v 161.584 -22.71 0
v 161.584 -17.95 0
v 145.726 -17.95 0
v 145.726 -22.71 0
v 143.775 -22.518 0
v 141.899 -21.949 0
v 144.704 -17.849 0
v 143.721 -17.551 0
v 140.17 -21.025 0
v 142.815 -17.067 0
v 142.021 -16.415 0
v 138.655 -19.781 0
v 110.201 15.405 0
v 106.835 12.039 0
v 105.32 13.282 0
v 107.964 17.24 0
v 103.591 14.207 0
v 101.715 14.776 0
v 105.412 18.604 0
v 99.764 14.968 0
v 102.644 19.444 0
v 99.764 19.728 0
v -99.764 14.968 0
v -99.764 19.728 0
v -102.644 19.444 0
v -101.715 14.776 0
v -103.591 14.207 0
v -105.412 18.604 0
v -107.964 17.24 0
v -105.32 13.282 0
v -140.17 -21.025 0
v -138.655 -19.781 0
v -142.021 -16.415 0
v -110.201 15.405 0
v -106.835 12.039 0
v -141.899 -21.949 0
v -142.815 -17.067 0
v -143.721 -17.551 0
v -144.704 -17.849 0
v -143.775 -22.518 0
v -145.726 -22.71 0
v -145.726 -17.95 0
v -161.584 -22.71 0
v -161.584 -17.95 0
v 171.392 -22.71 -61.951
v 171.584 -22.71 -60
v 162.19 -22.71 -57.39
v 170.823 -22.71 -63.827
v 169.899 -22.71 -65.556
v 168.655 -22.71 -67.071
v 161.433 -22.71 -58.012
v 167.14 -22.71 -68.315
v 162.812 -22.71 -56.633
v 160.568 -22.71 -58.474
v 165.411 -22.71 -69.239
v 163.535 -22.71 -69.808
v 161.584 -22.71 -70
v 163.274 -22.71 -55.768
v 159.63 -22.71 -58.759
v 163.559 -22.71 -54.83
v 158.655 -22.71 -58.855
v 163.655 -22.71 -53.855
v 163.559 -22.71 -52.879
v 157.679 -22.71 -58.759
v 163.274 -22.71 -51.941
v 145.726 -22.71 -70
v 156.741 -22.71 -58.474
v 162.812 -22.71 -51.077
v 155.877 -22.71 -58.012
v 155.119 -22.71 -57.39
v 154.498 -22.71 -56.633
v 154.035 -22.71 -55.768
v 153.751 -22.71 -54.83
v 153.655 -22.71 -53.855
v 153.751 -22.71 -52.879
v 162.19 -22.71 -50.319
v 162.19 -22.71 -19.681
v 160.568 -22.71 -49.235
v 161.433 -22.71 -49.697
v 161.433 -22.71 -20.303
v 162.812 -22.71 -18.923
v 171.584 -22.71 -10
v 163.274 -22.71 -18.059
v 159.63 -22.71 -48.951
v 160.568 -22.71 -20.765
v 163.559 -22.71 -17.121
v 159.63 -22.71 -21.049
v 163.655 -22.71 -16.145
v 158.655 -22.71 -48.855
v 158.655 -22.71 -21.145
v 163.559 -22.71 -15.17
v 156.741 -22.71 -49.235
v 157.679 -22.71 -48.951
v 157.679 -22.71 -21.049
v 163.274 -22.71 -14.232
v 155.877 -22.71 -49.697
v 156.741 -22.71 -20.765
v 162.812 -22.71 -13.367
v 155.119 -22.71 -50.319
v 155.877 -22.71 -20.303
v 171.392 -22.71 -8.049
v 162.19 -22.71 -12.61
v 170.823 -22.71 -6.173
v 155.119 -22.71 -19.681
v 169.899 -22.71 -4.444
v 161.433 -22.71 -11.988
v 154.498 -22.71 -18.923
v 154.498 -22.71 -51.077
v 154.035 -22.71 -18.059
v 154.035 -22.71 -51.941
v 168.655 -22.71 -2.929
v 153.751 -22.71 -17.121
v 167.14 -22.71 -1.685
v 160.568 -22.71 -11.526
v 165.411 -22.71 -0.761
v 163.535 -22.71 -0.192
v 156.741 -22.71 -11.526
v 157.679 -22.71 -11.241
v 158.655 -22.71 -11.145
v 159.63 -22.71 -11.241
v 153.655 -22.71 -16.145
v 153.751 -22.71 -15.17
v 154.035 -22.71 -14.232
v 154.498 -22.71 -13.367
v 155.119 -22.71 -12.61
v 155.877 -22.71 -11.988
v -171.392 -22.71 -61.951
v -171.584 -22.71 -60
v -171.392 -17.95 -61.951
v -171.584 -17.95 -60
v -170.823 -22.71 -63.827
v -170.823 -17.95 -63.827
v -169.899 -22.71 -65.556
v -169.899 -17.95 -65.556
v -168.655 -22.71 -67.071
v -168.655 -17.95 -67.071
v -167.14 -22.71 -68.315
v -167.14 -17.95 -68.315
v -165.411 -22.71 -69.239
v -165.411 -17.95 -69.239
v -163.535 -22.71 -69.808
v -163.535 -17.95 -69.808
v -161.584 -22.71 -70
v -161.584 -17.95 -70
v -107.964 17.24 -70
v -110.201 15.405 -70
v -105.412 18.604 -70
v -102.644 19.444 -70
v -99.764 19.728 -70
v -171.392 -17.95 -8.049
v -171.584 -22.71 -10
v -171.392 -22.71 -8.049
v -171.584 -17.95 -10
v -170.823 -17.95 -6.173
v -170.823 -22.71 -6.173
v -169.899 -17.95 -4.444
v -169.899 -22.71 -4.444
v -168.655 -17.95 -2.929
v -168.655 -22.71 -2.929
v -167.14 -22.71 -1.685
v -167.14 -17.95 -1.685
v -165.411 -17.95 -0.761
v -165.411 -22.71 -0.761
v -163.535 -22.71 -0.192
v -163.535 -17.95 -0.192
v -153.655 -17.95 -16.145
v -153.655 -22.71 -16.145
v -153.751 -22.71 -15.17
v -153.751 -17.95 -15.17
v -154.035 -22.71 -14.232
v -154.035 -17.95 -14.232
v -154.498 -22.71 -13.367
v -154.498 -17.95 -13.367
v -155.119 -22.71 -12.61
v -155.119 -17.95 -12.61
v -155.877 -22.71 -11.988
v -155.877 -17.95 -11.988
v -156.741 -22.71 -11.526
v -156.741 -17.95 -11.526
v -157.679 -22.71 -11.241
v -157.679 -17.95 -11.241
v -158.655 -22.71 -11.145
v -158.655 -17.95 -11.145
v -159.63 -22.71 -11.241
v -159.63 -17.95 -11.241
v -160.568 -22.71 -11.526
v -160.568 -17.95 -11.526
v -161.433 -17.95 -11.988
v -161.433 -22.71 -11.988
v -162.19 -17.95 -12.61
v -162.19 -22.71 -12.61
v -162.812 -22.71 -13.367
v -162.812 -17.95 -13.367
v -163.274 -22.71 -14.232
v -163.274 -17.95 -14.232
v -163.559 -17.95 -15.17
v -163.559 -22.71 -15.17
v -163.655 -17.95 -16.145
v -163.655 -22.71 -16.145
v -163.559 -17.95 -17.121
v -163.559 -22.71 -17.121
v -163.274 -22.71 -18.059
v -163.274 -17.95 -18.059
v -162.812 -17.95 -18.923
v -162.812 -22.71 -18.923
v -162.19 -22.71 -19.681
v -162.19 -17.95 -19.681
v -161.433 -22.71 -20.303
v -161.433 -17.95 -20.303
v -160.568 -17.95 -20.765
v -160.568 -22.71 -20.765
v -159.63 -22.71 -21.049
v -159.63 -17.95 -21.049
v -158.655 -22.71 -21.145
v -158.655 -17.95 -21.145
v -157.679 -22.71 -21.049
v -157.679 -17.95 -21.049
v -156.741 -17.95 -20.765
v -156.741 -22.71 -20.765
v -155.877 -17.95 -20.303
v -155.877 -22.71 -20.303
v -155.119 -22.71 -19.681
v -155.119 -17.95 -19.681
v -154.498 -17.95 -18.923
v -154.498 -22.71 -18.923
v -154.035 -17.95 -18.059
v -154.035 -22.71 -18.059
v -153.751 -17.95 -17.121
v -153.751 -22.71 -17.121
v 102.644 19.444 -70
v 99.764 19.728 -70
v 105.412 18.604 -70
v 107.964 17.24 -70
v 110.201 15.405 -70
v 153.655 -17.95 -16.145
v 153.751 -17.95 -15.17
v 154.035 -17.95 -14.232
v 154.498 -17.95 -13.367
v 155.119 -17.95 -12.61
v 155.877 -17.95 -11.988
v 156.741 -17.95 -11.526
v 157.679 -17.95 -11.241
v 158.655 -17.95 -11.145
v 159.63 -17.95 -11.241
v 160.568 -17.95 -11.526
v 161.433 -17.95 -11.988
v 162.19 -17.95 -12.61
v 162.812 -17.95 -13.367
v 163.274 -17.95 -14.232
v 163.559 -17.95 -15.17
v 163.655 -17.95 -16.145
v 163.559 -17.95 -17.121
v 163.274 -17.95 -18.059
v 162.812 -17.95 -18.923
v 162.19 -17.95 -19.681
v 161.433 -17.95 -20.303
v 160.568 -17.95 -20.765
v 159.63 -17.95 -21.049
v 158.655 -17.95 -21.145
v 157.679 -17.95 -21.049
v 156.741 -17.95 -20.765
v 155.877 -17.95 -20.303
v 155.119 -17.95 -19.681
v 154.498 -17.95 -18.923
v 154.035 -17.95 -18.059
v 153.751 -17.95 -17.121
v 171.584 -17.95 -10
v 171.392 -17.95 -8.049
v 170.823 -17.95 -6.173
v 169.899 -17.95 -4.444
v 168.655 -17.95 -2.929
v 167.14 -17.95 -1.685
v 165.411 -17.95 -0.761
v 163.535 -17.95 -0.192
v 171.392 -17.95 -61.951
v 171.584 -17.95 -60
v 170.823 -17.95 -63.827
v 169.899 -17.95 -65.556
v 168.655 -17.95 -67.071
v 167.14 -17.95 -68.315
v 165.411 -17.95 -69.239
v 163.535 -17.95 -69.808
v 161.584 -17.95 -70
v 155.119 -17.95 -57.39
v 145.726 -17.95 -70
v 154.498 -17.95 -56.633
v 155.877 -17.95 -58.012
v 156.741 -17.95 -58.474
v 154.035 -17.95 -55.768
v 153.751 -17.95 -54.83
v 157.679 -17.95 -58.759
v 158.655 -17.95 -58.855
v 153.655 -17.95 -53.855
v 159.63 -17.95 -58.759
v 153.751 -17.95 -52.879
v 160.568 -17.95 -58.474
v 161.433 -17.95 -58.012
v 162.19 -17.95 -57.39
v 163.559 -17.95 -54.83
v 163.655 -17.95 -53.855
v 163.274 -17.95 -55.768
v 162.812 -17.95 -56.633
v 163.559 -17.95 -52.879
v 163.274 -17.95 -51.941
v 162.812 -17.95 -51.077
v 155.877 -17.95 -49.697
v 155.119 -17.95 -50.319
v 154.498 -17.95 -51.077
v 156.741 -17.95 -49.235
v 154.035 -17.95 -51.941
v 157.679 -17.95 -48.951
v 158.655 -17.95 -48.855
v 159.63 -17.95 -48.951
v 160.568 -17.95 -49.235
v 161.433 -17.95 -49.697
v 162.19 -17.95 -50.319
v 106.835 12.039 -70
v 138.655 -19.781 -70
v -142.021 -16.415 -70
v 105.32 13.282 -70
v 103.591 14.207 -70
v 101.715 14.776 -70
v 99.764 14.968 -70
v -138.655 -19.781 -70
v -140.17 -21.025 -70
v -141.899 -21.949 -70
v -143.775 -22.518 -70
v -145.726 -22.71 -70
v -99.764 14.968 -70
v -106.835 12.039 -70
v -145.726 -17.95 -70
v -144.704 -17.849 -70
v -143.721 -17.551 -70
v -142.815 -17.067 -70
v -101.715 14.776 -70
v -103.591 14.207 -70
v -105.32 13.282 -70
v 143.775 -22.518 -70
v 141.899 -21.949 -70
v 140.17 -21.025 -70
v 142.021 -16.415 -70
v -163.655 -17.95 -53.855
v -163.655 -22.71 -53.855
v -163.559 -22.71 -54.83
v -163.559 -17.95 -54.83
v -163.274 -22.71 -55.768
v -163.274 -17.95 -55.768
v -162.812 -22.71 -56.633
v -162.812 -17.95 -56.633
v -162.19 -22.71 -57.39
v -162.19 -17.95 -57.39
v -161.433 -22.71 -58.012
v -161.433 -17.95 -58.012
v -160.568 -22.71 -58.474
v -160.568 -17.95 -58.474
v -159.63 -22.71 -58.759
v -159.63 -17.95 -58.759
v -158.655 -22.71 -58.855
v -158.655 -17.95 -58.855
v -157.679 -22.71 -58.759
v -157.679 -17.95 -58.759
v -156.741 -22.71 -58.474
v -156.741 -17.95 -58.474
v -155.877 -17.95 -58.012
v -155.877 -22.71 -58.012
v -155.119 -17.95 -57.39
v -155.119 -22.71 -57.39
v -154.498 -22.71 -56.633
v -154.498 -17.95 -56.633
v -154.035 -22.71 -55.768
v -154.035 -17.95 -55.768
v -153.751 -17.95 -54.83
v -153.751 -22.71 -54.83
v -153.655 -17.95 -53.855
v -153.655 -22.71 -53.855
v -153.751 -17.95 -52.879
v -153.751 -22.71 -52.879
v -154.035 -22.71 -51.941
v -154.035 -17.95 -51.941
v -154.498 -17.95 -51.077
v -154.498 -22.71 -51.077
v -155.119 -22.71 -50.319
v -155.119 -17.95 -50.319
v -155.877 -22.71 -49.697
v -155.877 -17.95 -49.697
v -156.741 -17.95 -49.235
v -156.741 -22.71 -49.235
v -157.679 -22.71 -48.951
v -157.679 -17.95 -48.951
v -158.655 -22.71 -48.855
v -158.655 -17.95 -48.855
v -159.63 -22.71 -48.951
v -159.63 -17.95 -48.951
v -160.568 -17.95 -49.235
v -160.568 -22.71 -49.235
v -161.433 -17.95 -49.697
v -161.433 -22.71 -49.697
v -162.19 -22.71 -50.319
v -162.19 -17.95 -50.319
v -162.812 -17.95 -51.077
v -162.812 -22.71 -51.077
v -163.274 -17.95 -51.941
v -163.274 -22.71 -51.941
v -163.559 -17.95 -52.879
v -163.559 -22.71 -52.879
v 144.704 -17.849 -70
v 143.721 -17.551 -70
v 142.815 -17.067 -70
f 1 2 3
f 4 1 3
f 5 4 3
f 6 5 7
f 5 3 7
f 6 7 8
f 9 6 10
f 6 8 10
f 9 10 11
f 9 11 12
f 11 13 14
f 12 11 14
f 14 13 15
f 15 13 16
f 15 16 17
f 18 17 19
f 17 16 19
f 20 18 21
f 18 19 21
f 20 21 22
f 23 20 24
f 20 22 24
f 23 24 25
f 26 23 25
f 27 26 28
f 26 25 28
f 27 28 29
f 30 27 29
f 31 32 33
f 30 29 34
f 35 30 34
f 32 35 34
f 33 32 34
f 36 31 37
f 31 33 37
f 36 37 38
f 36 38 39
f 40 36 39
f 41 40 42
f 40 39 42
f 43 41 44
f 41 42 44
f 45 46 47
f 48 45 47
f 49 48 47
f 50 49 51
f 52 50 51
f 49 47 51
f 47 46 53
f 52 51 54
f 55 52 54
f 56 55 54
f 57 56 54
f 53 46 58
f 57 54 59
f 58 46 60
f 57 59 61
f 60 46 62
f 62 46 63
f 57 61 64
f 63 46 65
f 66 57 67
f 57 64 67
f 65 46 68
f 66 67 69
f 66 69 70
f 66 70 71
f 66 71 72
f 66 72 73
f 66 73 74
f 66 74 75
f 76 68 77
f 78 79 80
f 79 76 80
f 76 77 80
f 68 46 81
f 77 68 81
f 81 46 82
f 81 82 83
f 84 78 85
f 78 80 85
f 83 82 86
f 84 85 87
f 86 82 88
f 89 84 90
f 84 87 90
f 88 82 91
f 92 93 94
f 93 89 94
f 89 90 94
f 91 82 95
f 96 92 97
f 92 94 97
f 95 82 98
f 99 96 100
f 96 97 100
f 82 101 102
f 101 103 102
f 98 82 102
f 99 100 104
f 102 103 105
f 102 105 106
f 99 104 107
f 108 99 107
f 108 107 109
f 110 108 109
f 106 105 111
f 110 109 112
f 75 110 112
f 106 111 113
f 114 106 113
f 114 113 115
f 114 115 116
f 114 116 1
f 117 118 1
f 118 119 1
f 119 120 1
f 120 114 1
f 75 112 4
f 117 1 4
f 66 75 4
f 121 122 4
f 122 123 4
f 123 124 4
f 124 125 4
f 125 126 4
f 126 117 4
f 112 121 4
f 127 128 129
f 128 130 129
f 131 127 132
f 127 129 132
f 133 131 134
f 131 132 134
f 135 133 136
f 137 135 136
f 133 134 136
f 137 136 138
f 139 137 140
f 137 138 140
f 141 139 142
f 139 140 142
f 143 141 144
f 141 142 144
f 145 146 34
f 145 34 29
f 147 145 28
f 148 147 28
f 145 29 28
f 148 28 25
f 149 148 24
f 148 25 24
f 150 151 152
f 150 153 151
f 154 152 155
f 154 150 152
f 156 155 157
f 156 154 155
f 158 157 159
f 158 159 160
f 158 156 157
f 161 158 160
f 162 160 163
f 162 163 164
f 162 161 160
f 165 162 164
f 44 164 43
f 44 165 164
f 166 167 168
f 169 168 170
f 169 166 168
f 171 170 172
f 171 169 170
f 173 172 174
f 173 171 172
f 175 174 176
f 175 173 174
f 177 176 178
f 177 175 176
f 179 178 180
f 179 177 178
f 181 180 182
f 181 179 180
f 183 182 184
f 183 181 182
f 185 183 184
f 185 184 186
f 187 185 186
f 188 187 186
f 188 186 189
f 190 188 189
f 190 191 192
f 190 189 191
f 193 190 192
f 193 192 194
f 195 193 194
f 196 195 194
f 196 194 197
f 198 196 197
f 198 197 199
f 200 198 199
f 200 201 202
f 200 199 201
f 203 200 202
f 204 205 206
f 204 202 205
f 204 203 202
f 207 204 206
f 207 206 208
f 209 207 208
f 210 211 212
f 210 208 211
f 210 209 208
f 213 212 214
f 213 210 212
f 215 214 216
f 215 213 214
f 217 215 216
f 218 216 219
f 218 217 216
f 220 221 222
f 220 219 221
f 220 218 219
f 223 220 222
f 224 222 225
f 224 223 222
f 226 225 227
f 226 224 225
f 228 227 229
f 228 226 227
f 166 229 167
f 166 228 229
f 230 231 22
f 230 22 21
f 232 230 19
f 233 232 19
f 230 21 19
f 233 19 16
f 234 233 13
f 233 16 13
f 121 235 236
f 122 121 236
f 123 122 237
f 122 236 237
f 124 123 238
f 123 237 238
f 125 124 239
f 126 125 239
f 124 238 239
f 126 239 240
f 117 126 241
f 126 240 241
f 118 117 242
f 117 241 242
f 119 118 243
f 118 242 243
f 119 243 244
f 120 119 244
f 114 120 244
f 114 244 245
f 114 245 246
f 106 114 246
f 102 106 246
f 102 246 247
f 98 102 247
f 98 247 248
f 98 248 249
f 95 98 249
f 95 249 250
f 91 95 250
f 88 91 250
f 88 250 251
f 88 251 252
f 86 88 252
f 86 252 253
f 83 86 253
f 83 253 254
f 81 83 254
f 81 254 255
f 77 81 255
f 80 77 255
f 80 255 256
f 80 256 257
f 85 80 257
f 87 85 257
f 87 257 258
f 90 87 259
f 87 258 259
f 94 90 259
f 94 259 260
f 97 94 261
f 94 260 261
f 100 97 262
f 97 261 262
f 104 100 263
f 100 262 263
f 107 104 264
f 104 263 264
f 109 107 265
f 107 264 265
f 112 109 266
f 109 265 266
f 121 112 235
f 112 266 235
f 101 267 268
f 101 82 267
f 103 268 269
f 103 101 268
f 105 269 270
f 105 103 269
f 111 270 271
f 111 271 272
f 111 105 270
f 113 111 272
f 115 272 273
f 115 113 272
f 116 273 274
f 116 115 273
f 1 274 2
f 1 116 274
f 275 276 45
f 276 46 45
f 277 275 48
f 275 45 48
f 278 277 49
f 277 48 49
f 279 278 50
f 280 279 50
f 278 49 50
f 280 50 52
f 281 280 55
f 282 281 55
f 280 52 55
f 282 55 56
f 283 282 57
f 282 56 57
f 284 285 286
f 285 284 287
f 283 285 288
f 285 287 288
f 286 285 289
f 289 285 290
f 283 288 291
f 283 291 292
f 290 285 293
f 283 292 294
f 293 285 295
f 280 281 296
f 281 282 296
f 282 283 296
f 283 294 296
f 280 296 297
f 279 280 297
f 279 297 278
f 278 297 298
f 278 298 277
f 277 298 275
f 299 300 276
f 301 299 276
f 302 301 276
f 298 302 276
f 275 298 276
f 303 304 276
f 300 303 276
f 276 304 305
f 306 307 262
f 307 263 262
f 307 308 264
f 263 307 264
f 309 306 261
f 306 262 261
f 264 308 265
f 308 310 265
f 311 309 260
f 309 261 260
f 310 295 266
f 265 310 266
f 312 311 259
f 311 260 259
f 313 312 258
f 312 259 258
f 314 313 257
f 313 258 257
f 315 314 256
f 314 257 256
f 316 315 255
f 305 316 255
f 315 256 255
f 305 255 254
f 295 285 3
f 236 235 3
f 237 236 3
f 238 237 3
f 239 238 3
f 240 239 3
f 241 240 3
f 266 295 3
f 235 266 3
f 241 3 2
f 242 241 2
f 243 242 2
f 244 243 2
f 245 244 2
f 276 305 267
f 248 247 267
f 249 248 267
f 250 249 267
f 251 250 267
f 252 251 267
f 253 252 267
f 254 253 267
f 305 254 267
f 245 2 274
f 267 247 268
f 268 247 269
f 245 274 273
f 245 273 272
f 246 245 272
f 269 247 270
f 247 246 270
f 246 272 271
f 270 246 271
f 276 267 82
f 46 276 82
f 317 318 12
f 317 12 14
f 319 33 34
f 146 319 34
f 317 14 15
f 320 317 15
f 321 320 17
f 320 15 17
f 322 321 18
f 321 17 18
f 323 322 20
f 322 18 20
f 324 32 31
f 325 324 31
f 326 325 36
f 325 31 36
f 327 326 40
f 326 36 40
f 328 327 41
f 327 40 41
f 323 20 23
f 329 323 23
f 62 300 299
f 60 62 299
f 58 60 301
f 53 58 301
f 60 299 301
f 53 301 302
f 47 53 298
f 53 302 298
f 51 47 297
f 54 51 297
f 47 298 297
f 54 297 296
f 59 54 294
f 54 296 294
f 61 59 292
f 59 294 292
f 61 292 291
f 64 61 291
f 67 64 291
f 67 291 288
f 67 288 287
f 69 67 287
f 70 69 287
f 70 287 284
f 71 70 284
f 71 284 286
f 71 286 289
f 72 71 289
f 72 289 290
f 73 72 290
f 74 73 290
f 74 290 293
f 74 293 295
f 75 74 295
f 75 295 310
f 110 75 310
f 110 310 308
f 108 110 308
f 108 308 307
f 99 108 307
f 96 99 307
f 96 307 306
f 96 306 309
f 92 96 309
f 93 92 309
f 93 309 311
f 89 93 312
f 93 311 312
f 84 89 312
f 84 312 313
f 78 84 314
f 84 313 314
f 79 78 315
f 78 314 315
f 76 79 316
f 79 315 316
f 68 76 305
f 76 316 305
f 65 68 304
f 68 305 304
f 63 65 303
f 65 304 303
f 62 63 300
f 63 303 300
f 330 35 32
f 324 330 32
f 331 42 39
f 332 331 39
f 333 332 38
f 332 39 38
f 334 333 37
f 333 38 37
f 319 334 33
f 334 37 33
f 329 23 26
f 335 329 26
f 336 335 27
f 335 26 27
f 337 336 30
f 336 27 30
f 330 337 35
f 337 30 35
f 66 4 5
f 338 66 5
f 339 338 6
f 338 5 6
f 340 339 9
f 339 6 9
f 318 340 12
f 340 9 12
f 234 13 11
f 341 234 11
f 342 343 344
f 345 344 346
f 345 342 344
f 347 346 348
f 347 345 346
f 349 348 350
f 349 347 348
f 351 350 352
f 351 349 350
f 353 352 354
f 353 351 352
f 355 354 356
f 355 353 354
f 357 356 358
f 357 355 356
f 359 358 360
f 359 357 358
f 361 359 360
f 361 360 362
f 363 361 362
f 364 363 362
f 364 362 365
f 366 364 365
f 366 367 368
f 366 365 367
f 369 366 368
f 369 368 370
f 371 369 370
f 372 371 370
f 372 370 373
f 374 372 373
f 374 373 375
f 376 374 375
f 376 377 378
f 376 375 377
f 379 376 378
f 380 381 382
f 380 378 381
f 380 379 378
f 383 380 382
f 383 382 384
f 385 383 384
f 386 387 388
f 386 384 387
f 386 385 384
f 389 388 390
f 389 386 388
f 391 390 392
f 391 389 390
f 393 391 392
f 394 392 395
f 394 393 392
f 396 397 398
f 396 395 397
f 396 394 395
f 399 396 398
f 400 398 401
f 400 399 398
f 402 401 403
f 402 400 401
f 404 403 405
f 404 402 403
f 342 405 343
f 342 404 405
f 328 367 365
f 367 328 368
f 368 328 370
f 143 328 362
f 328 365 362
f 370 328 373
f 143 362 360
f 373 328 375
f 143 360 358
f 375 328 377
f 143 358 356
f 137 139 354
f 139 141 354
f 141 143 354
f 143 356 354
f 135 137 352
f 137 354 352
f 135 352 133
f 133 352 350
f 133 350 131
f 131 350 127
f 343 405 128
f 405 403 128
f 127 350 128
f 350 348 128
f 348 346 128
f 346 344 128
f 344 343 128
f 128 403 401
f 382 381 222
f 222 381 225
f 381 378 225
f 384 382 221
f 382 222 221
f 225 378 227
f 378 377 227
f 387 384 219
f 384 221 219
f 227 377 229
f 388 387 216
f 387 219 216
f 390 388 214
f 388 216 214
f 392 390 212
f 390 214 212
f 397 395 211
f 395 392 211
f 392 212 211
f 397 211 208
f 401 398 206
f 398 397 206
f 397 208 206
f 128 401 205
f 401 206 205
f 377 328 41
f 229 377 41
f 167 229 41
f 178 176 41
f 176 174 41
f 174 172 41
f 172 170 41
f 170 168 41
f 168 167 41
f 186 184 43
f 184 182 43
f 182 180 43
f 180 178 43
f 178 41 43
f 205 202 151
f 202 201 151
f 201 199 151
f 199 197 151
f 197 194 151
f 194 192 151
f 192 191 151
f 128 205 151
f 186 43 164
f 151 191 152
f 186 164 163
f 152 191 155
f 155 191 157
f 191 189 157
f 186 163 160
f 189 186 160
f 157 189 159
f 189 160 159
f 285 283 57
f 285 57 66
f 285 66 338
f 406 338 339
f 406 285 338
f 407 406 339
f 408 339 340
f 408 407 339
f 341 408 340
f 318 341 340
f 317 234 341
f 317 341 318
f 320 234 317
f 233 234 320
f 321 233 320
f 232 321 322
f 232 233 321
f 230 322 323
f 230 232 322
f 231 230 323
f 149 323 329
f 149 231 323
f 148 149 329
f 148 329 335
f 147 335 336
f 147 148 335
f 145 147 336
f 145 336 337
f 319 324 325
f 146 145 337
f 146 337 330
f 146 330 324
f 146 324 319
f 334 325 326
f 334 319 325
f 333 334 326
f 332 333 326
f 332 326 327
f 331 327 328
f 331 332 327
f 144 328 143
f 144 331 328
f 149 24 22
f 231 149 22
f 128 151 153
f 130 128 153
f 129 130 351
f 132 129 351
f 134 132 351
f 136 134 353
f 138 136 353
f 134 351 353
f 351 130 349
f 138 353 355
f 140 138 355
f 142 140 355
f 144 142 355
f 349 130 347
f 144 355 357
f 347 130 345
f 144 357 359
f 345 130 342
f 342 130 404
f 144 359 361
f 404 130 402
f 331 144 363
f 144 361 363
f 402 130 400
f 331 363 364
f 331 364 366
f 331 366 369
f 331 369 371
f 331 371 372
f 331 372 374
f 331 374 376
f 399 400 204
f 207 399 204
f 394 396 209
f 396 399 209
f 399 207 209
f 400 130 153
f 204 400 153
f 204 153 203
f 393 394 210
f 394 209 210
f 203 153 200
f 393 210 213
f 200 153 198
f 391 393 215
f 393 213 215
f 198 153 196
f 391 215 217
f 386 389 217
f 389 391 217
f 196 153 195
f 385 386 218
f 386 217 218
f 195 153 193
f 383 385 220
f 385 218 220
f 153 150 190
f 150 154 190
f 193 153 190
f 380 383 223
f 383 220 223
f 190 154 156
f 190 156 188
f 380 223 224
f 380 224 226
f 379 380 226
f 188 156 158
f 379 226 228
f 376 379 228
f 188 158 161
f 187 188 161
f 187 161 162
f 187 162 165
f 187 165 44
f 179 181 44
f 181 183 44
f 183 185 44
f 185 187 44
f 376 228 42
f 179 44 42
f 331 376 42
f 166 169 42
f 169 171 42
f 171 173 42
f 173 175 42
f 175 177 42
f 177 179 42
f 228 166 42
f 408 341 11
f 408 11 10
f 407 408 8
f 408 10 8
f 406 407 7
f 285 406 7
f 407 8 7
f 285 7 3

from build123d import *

# Parameters (mm, degrees)
BOSS_EXTRUDE1_DEPTH = 70
FILLET1_R           = 10
SKETCH2_R           = 5
CUT_EXTRUDE1_DEPTH  = 10


with BuildPart() as part:
    # Sketch1 → Boss-Extrude1 (new body)
    with BuildSketch(Plane.XY):
        with BuildLine():
            Line((110.200913438, 15.404640081), (142.020718591, -16.415165072))
            ThreePointArc((142.020718591, -16.415165072), (143.720696939, -17.551054289), (145.725958124, -17.949925539))
            Line((145.725958124, -17.949925539), (171.583822501, -17.949925539))
            Line((171.583822501, -17.949925539), (171.583822501, -22.709925539))
            Line((171.583822501, -22.709925539), (145.725958124, -22.709925539))
            ThreePointArc((145.725958124, -22.709925539), (141.899123801, -21.948720864), (138.654890312, -19.780993351))
            Line((138.654890312, -19.780993351), (106.835085159, 12.038811802))
            ThreePointArc((106.835085159, 12.038811802), (103.590851671, 14.206539316), (99.764017347, 14.967743991))
            Line((99.764017347, 14.967743991), (12.581613091, 14.967743991))
            Line((12.581613091, 14.967743991), (-99.764017347, 14.967743991))
            ThreePointArc((-99.764017347, 14.967743991), (-103.590851671, 14.206539316), (-106.835085159, 12.038811802))
            Line((-106.835085159, 12.038811802), (-138.654890312, -19.780993351))
            ThreePointArc((-138.654890312, -19.780993351), (-141.899123801, -21.948720864), (-145.725958124, -22.709925539))
            Line((-145.725958124, -22.709925539), (-171.583822501, -22.709925539))
            Line((-171.583822501, -22.709925539), (-171.583822501, -17.949925539))
            Line((-171.583822501, -17.949925539), (-145.725958124, -17.949925539))
            ThreePointArc((-145.725958124, -17.949925539), (-143.720696939, -17.551054289), (-142.020718591, -16.415165072))
            Line((-142.020718591, -16.415165072), (-110.200913438, 15.404640081))
            ThreePointArc((-110.200913438, 15.404640081), (-105.412424809, 18.60420589), (-99.764017347, 19.727743991))
            Line((-99.764017347, 19.727743991), (12.581613091, 19.727743991))
            Line((12.581613091, 19.727743991), (99.764017347, 19.727743991))
            ThreePointArc((99.764017347, 19.727743991), (105.412424809, 18.60420589), (110.200913438, 15.404640081))
        make_face()
    extrude(amount=-BOSS_EXTRUDE1_DEPTH)

    # Fillet1
    fillet1_edges = [part.edges().sort_by_distance(p)[0] for p in [
        (171.583822501, -20.329925539, 0),
        (-171.583822501, -20.329925539, 0),
        (-171.583822501, -20.329925539, -70),
        (171.583822501, -20.329925539, -70),
    ]]
    fillet(fillet1_edges, radius=FILLET1_R)

    # Sketch2 → Cut-Extrude1 (cut)
    with BuildSketch(Plane(origin=(0, -17.949925539, 0), x_dir=(1, 0, 0), z_dir=(0, 1, 0))):
        with BuildLine():
            ThreePointArc((153.654890312, 53.854773815), (158.654890312, 48.854773815), (163.654890312, 53.854773815))
            Line((163.654890312, 53.854773815), (153.654890312, 53.854773815))
        make_face()
        with BuildLine():
            Line((153.654890312, 53.854773815), (163.654890312, 53.854773815))
            ThreePointArc((163.654890312, 53.854773815), (158.654890312, 58.854773815), (153.654890312, 53.854773815))
        make_face()
        with Locations(Location((158.654890312, 16.145226185, 0), (0, 0, 180))):
            Circle(SKETCH2_R)
    cut_extrude1 = extrude(amount=-CUT_EXTRUDE1_DEPTH, mode=Mode.SUBTRACT)

    # Mirror1: Cut-Extrude1 across plane
    add(cut_extrude1.mirror(Plane(origin=(0, 0, 0), x_dir=(0, 0, 1), z_dir=(1, 0, 0))), mode=Mode.SUBTRACT)


solid = part.part
